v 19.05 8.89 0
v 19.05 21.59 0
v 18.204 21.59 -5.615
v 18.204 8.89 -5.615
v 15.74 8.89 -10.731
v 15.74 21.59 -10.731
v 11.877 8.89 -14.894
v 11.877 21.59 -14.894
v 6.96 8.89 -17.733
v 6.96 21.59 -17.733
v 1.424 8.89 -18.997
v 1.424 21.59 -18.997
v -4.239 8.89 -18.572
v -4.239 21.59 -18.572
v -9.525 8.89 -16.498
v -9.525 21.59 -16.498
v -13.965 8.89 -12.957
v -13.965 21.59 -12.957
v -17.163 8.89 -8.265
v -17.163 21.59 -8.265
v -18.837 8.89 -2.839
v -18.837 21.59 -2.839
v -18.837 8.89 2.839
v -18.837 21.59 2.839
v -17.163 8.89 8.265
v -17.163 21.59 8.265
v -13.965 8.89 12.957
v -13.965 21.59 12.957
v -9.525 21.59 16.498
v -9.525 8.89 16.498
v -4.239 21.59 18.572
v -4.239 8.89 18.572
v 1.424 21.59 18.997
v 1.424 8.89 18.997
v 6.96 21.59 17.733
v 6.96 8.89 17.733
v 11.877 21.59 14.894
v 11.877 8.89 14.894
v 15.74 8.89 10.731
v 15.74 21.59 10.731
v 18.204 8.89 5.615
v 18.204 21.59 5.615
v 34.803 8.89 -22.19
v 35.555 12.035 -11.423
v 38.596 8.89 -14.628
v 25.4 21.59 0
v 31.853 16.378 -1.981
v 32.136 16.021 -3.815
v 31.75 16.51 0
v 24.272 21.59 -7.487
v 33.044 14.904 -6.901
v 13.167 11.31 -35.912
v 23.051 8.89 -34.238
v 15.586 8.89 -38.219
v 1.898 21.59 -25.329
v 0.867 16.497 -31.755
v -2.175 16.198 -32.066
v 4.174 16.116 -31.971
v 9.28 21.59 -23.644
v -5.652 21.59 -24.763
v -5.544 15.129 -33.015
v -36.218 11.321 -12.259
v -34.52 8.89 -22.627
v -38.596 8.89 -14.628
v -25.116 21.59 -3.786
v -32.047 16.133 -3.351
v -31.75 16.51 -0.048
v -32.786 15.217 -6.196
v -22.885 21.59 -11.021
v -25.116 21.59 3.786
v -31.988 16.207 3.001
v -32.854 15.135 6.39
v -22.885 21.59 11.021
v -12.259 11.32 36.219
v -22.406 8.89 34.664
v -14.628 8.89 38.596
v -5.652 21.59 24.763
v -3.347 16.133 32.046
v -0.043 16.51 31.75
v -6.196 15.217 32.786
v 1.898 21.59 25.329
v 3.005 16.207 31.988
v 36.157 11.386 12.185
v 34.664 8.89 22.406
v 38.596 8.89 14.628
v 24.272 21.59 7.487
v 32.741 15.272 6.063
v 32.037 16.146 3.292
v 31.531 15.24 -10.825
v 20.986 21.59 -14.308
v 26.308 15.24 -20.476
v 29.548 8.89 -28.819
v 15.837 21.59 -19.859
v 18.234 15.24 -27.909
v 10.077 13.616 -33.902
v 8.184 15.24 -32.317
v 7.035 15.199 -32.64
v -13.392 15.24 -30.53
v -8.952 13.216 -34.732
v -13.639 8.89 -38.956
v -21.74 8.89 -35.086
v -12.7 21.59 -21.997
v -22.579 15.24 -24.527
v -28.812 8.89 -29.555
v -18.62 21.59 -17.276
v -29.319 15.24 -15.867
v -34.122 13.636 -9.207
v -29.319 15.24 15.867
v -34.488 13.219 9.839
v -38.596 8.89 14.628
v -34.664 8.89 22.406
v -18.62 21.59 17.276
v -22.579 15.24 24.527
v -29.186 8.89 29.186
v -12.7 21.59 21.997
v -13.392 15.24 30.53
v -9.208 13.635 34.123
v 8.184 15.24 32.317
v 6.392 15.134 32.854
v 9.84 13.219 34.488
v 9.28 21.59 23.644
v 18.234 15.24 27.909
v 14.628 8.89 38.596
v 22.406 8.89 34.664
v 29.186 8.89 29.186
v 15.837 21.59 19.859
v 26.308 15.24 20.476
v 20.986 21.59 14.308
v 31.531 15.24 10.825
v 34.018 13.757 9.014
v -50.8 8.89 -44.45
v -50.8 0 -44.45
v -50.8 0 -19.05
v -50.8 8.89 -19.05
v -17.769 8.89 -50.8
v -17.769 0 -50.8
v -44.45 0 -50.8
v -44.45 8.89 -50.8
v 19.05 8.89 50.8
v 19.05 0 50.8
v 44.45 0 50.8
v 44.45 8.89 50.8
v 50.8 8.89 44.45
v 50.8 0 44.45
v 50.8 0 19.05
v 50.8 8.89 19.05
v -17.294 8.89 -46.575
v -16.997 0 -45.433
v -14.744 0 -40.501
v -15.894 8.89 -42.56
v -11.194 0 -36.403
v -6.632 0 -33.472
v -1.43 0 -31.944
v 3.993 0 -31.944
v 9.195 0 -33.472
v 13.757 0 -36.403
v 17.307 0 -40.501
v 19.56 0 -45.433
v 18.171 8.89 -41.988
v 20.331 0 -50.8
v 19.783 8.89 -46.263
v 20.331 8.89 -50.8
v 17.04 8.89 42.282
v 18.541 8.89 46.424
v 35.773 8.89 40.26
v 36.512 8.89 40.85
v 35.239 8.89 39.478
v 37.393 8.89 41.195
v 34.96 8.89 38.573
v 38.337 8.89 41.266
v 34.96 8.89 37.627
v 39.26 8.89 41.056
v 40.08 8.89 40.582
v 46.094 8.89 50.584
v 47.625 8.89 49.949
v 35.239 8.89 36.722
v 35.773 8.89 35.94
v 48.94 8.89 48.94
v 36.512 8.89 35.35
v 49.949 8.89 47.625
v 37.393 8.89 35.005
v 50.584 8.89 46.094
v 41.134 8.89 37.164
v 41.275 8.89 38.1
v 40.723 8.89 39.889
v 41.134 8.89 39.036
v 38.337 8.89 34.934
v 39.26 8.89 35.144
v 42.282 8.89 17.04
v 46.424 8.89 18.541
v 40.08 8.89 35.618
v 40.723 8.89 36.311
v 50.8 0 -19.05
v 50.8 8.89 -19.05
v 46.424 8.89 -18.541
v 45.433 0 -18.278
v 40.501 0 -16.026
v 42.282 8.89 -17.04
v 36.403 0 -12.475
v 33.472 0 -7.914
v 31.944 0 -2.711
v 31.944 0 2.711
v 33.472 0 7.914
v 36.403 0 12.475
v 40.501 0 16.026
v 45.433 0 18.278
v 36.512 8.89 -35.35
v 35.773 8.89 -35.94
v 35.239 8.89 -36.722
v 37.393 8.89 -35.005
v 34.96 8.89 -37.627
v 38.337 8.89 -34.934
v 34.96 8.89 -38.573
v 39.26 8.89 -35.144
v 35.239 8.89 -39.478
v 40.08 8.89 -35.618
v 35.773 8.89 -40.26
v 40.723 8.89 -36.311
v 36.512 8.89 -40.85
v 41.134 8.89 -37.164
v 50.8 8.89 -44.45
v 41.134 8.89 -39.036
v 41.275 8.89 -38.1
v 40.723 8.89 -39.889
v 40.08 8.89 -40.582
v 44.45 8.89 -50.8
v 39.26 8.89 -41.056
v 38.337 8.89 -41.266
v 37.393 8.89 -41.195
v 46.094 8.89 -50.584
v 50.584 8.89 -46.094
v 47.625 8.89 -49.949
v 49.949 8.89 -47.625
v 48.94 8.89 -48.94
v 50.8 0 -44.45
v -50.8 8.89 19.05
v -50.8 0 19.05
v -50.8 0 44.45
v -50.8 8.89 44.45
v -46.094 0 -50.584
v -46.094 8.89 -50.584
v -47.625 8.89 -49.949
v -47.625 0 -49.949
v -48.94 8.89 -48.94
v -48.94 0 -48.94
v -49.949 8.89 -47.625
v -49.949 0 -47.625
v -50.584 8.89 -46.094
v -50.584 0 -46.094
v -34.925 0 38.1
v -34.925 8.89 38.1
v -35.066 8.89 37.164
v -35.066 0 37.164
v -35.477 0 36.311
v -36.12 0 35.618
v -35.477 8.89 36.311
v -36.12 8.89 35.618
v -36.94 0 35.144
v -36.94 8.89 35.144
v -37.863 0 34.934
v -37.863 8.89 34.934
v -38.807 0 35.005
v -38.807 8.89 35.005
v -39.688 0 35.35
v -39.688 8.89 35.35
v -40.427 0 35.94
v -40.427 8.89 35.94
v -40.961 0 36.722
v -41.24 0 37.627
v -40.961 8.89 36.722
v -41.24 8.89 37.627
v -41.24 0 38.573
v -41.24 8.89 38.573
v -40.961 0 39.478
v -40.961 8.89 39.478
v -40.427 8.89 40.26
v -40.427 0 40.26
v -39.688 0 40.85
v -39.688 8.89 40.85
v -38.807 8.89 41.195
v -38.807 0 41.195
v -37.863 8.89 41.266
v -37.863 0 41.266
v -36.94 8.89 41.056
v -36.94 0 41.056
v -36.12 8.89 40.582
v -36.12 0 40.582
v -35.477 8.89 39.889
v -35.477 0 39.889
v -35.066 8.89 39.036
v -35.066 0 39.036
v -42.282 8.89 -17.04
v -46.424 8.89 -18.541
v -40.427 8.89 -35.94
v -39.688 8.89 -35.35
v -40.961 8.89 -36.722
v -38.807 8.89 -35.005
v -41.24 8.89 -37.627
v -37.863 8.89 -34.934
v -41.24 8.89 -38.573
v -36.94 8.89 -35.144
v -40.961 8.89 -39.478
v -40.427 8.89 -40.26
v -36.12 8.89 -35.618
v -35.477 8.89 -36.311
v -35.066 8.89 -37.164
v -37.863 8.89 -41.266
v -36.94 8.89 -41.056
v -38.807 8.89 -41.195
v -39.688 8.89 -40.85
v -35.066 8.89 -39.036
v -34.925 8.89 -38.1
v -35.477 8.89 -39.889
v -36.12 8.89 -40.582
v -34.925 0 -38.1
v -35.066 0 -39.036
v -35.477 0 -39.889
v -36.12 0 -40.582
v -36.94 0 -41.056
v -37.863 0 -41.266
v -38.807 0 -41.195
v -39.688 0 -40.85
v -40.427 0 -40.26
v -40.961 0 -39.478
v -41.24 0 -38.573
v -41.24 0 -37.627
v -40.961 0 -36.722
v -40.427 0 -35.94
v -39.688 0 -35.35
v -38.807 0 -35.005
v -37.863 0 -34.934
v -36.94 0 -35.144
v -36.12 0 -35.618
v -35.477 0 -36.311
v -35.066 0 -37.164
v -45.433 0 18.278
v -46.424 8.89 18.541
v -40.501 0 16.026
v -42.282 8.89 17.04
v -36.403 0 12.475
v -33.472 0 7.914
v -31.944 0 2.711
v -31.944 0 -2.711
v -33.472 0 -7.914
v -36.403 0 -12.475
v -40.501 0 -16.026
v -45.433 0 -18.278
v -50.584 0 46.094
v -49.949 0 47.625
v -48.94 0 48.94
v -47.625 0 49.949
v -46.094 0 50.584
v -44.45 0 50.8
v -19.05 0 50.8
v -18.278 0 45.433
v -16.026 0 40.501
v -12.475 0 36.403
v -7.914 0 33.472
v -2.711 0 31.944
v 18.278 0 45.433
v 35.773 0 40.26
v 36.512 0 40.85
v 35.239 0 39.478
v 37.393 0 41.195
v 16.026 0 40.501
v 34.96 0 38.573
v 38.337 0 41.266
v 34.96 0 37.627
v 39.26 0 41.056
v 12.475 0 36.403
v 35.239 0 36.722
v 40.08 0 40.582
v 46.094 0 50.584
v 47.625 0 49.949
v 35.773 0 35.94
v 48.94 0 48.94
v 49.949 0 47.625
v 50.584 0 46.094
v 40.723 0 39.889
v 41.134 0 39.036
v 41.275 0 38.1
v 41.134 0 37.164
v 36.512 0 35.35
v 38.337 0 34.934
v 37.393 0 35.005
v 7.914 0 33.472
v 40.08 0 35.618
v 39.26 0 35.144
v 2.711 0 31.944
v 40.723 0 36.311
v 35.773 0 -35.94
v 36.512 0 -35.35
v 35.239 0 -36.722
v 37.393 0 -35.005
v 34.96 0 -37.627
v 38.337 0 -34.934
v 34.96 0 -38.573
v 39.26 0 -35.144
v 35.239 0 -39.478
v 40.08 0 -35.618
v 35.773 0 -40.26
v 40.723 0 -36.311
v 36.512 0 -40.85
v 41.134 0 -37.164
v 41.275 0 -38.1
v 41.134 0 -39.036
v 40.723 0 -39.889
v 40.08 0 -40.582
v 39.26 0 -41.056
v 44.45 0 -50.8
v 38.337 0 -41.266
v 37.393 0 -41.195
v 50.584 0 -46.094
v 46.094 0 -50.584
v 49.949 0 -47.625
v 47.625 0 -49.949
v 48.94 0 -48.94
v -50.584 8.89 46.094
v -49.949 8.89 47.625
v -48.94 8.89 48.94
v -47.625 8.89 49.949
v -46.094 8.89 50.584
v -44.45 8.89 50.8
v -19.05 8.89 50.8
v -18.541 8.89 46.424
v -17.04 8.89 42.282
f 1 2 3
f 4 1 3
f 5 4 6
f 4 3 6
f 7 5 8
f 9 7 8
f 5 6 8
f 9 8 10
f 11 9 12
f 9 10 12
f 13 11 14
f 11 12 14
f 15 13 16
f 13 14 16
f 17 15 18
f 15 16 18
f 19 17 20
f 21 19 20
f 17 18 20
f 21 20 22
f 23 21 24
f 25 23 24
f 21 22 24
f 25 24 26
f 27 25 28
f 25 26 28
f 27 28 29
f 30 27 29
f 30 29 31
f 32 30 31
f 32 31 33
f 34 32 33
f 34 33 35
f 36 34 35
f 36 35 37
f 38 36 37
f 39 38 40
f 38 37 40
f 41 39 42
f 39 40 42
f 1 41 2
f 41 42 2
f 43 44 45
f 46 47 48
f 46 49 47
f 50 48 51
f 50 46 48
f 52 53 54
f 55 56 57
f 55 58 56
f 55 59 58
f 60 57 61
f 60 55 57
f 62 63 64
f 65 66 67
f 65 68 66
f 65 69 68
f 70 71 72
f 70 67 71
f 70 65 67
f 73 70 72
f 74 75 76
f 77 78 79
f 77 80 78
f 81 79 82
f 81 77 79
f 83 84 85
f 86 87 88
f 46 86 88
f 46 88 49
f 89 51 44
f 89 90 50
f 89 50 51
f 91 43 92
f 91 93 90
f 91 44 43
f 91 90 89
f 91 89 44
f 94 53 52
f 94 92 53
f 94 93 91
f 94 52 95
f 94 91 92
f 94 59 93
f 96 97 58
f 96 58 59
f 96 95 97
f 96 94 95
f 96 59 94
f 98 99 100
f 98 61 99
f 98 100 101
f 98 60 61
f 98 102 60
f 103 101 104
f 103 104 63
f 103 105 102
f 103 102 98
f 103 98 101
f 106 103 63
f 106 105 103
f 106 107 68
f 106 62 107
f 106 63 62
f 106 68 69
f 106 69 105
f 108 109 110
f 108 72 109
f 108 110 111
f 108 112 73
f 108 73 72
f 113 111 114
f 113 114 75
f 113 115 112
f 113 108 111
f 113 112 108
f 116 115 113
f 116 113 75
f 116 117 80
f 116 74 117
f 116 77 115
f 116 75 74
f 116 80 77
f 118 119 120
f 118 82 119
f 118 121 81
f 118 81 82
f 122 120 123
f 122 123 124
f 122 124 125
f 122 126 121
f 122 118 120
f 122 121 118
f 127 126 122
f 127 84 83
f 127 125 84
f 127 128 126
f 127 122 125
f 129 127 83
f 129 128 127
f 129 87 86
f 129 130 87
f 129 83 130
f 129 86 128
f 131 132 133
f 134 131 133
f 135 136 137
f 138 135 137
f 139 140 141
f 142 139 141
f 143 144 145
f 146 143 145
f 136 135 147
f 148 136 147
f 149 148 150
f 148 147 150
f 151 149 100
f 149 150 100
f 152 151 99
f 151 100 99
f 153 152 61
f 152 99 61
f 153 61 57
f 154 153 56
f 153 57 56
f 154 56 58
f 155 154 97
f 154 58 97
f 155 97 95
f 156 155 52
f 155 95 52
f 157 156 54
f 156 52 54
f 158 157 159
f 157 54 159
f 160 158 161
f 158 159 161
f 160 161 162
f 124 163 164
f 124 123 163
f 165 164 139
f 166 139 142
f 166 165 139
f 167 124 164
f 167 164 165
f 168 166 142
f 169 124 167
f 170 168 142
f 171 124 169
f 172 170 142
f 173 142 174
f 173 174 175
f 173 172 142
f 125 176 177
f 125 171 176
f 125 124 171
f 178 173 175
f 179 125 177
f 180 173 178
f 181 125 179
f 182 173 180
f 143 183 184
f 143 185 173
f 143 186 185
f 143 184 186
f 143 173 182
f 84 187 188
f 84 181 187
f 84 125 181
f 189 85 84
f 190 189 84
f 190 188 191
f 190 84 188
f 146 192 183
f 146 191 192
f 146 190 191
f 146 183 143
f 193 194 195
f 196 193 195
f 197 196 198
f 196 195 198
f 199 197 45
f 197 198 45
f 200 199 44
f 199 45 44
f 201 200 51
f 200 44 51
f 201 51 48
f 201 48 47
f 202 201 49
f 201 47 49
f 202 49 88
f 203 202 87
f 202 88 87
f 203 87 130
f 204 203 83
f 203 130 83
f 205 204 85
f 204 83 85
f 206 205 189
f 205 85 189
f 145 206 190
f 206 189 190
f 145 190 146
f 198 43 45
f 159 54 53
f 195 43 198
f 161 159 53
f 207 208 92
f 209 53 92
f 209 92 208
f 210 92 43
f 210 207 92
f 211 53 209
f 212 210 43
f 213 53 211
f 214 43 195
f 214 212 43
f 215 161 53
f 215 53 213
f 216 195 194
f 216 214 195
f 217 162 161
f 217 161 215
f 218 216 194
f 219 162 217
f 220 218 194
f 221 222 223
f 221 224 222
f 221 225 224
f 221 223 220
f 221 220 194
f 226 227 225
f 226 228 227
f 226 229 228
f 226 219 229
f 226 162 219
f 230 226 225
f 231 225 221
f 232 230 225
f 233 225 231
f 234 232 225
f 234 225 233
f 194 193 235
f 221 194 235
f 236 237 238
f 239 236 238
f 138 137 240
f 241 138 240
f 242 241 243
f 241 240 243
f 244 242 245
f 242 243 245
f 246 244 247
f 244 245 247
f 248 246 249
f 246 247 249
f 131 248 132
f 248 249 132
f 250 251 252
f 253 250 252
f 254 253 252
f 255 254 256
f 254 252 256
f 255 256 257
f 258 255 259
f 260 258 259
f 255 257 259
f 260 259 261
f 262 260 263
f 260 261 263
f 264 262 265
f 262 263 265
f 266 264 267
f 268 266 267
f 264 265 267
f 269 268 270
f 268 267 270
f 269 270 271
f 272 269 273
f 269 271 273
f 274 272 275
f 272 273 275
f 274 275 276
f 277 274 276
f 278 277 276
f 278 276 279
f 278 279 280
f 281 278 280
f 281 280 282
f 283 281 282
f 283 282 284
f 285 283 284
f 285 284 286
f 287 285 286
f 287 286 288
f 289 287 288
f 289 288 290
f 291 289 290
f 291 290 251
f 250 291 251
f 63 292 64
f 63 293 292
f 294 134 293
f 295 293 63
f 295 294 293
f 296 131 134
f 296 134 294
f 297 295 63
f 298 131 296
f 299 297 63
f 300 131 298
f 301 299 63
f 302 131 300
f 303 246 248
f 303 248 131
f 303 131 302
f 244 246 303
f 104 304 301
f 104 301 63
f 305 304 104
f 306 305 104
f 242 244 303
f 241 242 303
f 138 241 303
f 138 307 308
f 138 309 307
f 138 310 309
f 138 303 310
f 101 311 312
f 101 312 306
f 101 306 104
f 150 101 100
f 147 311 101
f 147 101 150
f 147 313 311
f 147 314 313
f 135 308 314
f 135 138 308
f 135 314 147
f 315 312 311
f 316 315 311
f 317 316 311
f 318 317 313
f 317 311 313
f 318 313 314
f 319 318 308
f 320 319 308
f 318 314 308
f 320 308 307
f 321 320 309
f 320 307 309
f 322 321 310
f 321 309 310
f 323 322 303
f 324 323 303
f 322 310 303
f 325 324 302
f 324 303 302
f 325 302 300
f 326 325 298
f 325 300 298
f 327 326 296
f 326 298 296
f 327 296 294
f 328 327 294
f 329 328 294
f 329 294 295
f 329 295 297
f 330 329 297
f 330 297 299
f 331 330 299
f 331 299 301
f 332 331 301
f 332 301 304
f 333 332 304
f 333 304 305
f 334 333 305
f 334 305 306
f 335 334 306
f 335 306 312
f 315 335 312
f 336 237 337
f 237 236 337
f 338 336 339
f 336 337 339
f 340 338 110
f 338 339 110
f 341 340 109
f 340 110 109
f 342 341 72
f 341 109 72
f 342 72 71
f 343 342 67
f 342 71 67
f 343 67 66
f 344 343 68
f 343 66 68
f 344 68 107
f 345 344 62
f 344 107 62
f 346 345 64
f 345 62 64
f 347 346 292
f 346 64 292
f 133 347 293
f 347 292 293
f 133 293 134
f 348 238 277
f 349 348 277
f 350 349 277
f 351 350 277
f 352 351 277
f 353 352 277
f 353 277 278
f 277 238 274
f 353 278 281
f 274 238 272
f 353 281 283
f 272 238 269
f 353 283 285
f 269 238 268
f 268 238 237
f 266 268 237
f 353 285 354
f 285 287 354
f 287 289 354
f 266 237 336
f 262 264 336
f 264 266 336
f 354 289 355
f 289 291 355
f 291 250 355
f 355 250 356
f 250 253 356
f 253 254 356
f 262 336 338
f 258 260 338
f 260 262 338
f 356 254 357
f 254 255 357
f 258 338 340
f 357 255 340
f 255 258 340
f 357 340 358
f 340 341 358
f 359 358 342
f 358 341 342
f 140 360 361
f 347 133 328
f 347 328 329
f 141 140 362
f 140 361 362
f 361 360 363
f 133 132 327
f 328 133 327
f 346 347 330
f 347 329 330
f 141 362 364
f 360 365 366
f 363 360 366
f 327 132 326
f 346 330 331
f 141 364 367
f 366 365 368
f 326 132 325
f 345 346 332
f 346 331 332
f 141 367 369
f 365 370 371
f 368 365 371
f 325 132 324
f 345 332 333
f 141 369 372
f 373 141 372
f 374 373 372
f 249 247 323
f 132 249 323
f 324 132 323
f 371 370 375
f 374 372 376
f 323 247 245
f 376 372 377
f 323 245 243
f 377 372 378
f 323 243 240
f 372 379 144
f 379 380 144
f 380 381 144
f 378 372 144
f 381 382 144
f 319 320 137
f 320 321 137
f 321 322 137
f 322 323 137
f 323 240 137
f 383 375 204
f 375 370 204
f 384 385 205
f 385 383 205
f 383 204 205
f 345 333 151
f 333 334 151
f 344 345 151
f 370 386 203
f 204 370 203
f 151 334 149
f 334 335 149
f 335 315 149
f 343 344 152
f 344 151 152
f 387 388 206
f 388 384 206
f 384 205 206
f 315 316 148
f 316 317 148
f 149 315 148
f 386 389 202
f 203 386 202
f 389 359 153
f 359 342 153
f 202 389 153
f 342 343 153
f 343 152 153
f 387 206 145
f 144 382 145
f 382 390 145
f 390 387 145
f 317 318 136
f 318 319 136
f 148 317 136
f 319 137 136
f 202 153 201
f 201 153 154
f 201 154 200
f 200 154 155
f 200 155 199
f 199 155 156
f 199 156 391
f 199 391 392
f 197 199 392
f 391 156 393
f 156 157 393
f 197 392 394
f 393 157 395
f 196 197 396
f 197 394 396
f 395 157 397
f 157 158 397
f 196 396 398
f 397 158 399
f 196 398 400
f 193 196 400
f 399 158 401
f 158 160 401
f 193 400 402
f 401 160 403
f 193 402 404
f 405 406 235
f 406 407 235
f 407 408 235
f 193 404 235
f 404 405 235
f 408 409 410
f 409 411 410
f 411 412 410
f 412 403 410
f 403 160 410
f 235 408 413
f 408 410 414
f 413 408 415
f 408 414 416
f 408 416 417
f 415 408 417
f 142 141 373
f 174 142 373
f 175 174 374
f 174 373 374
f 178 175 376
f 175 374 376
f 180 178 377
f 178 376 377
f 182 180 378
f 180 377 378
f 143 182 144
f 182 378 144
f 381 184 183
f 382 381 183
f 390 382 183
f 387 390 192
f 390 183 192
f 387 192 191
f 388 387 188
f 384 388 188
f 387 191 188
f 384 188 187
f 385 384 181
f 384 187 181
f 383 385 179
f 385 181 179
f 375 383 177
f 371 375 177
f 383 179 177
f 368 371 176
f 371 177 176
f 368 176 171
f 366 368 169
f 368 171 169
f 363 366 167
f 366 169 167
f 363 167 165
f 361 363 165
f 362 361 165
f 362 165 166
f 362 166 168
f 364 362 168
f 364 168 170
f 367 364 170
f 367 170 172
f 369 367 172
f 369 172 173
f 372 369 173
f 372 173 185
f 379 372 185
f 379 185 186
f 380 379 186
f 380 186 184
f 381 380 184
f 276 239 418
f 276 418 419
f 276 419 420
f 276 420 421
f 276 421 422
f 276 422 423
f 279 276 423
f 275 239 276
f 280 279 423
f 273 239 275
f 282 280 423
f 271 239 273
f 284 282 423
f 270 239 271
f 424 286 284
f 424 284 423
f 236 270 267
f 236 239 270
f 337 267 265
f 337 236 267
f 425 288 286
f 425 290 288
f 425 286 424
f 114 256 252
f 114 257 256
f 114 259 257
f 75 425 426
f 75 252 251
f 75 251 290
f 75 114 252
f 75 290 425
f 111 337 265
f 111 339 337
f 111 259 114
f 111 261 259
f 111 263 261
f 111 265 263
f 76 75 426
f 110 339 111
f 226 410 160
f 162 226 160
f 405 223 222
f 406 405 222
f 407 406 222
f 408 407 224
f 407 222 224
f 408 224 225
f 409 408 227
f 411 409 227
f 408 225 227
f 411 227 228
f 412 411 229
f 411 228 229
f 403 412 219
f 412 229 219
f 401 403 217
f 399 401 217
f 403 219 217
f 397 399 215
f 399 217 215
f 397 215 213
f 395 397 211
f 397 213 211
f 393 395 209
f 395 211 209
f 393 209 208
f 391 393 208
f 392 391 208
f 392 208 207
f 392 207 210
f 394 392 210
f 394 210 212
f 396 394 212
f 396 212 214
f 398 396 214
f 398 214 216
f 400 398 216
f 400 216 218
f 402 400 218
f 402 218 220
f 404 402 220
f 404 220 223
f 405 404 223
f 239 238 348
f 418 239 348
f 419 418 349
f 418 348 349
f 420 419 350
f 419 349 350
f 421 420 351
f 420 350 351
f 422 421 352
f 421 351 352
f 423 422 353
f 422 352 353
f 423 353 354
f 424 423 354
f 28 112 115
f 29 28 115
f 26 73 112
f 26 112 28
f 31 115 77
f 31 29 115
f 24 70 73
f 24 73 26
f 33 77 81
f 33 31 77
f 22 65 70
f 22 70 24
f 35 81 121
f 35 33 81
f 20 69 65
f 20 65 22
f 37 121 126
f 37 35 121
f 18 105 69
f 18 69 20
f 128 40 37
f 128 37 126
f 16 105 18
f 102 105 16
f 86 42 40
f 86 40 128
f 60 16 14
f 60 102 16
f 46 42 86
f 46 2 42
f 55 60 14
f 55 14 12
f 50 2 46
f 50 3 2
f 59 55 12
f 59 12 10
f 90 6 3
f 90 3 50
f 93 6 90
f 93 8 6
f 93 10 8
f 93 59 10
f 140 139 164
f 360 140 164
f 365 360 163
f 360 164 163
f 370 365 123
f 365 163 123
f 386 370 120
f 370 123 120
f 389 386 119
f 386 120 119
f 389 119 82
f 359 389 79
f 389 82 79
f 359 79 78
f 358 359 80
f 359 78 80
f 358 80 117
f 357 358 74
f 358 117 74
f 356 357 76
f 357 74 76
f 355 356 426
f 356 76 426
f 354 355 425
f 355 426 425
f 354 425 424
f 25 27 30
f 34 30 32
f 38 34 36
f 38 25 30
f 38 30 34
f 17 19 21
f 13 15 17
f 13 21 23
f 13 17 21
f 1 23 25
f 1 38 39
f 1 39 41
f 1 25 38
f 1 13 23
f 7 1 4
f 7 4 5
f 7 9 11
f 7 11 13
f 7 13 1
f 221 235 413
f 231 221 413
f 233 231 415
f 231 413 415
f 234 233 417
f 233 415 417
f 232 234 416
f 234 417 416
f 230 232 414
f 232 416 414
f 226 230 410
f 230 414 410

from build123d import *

# Parameters (mm, degrees)
BOSS_EXTRUDE2_DEPTH = 8.89
SKETCH11_R          = 19.05
CUT_EXTRUDE1_DEPTH  = 127
SKETCH12_R          = 19.05
CUT_EXTRUDE2_DEPTH  = 12.7
SKETCH13_R          = 3.175
CUT_EXTRUDE3_DEPTH  = 12.7


with BuildPart() as part:
    # Sketch1 → Boss-Extrude2 (new body)
    with BuildSketch(Plane(origin=(0, 0, 0), x_dir=(1, 0, 0), z_dir=(0, 1, 0))):
        with BuildLine():
            Line((-44.45, -50.8), (44.45, -50.8))
            ThreePointArc((44.45, -50.8), (48.940128061, -48.940128061), (50.8, -44.45))
            Line((50.8, -44.45), (50.8, 44.45))
            ThreePointArc((50.8, 44.45), (48.940128061, 48.940128061), (44.45, 50.8))
            Line((44.45, 50.8), (-44.45, 50.8))
            ThreePointArc((-44.45, 50.8), (-48.940128061, 48.940128061), (-50.8, 44.45))
            Line((-50.8, 44.45), (-50.8, -44.45))
            ThreePointArc((-50.8, -44.45), (-48.940128061, -48.940128061), (-44.45, -50.8))
        make_face()
    extrude(amount=BOSS_EXTRUDE2_DEPTH)

    # Sketch10 → Revolve1 (revolve)
    with BuildSketch(Plane.XY):
        Polygon((0, 21.59), (0, 8.89), (41.275, 8.89), (25.4, 21.59), align=None)
    revolve(axis=Axis((0, 0, 0), (0, 1, 0)))

    # Sketch11 → Cut-Extrude1 (cut)
    with BuildSketch(Plane(origin=(0, 21.59, 0), x_dir=(1, 0, 0), z_dir=(0, 1, 0))):
        with Locations((1.281459619, 50.8)):
            Circle(SKETCH11_R)
        with Locations((50.8, 0)):
            Circle(SKETCH11_R)
        with Locations((0, -50.8)):
            Circle(SKETCH11_R)
        with Locations((-50.8, 0)):
            Circle(SKETCH11_R)
    extrude(amount=-CUT_EXTRUDE1_DEPTH, mode=Mode.SUBTRACT)

    # Sketch12 → Cut-Extrude2 (cut)
    with BuildSketch(Plane(origin=(0, 21.59, 0), x_dir=(1, 0, 0), z_dir=(0, 1, 0))):
        Circle(SKETCH12_R)
    extrude(amount=-CUT_EXTRUDE2_DEPTH, mode=Mode.SUBTRACT)

    # Sketch13 → Cut-Extrude3 (cut)
    with BuildSketch(Plane(origin=(0, 8.89, 0), x_dir=(1, 0, 0), z_dir=(0, 1, 0))):
        with Locations((-38.1, 38.1)):
            Circle(SKETCH13_R)
        with Locations((38.1, 38.1)):
            Circle(SKETCH13_R)
        with Locations((38.1, -38.1)):
            Circle(SKETCH13_R)
        with Locations((-38.1, -38.1)):
            Circle(SKETCH13_R)
    extrude(amount=-CUT_EXTRUDE3_DEPTH, mode=Mode.SUBTRACT)


solid = part.part
